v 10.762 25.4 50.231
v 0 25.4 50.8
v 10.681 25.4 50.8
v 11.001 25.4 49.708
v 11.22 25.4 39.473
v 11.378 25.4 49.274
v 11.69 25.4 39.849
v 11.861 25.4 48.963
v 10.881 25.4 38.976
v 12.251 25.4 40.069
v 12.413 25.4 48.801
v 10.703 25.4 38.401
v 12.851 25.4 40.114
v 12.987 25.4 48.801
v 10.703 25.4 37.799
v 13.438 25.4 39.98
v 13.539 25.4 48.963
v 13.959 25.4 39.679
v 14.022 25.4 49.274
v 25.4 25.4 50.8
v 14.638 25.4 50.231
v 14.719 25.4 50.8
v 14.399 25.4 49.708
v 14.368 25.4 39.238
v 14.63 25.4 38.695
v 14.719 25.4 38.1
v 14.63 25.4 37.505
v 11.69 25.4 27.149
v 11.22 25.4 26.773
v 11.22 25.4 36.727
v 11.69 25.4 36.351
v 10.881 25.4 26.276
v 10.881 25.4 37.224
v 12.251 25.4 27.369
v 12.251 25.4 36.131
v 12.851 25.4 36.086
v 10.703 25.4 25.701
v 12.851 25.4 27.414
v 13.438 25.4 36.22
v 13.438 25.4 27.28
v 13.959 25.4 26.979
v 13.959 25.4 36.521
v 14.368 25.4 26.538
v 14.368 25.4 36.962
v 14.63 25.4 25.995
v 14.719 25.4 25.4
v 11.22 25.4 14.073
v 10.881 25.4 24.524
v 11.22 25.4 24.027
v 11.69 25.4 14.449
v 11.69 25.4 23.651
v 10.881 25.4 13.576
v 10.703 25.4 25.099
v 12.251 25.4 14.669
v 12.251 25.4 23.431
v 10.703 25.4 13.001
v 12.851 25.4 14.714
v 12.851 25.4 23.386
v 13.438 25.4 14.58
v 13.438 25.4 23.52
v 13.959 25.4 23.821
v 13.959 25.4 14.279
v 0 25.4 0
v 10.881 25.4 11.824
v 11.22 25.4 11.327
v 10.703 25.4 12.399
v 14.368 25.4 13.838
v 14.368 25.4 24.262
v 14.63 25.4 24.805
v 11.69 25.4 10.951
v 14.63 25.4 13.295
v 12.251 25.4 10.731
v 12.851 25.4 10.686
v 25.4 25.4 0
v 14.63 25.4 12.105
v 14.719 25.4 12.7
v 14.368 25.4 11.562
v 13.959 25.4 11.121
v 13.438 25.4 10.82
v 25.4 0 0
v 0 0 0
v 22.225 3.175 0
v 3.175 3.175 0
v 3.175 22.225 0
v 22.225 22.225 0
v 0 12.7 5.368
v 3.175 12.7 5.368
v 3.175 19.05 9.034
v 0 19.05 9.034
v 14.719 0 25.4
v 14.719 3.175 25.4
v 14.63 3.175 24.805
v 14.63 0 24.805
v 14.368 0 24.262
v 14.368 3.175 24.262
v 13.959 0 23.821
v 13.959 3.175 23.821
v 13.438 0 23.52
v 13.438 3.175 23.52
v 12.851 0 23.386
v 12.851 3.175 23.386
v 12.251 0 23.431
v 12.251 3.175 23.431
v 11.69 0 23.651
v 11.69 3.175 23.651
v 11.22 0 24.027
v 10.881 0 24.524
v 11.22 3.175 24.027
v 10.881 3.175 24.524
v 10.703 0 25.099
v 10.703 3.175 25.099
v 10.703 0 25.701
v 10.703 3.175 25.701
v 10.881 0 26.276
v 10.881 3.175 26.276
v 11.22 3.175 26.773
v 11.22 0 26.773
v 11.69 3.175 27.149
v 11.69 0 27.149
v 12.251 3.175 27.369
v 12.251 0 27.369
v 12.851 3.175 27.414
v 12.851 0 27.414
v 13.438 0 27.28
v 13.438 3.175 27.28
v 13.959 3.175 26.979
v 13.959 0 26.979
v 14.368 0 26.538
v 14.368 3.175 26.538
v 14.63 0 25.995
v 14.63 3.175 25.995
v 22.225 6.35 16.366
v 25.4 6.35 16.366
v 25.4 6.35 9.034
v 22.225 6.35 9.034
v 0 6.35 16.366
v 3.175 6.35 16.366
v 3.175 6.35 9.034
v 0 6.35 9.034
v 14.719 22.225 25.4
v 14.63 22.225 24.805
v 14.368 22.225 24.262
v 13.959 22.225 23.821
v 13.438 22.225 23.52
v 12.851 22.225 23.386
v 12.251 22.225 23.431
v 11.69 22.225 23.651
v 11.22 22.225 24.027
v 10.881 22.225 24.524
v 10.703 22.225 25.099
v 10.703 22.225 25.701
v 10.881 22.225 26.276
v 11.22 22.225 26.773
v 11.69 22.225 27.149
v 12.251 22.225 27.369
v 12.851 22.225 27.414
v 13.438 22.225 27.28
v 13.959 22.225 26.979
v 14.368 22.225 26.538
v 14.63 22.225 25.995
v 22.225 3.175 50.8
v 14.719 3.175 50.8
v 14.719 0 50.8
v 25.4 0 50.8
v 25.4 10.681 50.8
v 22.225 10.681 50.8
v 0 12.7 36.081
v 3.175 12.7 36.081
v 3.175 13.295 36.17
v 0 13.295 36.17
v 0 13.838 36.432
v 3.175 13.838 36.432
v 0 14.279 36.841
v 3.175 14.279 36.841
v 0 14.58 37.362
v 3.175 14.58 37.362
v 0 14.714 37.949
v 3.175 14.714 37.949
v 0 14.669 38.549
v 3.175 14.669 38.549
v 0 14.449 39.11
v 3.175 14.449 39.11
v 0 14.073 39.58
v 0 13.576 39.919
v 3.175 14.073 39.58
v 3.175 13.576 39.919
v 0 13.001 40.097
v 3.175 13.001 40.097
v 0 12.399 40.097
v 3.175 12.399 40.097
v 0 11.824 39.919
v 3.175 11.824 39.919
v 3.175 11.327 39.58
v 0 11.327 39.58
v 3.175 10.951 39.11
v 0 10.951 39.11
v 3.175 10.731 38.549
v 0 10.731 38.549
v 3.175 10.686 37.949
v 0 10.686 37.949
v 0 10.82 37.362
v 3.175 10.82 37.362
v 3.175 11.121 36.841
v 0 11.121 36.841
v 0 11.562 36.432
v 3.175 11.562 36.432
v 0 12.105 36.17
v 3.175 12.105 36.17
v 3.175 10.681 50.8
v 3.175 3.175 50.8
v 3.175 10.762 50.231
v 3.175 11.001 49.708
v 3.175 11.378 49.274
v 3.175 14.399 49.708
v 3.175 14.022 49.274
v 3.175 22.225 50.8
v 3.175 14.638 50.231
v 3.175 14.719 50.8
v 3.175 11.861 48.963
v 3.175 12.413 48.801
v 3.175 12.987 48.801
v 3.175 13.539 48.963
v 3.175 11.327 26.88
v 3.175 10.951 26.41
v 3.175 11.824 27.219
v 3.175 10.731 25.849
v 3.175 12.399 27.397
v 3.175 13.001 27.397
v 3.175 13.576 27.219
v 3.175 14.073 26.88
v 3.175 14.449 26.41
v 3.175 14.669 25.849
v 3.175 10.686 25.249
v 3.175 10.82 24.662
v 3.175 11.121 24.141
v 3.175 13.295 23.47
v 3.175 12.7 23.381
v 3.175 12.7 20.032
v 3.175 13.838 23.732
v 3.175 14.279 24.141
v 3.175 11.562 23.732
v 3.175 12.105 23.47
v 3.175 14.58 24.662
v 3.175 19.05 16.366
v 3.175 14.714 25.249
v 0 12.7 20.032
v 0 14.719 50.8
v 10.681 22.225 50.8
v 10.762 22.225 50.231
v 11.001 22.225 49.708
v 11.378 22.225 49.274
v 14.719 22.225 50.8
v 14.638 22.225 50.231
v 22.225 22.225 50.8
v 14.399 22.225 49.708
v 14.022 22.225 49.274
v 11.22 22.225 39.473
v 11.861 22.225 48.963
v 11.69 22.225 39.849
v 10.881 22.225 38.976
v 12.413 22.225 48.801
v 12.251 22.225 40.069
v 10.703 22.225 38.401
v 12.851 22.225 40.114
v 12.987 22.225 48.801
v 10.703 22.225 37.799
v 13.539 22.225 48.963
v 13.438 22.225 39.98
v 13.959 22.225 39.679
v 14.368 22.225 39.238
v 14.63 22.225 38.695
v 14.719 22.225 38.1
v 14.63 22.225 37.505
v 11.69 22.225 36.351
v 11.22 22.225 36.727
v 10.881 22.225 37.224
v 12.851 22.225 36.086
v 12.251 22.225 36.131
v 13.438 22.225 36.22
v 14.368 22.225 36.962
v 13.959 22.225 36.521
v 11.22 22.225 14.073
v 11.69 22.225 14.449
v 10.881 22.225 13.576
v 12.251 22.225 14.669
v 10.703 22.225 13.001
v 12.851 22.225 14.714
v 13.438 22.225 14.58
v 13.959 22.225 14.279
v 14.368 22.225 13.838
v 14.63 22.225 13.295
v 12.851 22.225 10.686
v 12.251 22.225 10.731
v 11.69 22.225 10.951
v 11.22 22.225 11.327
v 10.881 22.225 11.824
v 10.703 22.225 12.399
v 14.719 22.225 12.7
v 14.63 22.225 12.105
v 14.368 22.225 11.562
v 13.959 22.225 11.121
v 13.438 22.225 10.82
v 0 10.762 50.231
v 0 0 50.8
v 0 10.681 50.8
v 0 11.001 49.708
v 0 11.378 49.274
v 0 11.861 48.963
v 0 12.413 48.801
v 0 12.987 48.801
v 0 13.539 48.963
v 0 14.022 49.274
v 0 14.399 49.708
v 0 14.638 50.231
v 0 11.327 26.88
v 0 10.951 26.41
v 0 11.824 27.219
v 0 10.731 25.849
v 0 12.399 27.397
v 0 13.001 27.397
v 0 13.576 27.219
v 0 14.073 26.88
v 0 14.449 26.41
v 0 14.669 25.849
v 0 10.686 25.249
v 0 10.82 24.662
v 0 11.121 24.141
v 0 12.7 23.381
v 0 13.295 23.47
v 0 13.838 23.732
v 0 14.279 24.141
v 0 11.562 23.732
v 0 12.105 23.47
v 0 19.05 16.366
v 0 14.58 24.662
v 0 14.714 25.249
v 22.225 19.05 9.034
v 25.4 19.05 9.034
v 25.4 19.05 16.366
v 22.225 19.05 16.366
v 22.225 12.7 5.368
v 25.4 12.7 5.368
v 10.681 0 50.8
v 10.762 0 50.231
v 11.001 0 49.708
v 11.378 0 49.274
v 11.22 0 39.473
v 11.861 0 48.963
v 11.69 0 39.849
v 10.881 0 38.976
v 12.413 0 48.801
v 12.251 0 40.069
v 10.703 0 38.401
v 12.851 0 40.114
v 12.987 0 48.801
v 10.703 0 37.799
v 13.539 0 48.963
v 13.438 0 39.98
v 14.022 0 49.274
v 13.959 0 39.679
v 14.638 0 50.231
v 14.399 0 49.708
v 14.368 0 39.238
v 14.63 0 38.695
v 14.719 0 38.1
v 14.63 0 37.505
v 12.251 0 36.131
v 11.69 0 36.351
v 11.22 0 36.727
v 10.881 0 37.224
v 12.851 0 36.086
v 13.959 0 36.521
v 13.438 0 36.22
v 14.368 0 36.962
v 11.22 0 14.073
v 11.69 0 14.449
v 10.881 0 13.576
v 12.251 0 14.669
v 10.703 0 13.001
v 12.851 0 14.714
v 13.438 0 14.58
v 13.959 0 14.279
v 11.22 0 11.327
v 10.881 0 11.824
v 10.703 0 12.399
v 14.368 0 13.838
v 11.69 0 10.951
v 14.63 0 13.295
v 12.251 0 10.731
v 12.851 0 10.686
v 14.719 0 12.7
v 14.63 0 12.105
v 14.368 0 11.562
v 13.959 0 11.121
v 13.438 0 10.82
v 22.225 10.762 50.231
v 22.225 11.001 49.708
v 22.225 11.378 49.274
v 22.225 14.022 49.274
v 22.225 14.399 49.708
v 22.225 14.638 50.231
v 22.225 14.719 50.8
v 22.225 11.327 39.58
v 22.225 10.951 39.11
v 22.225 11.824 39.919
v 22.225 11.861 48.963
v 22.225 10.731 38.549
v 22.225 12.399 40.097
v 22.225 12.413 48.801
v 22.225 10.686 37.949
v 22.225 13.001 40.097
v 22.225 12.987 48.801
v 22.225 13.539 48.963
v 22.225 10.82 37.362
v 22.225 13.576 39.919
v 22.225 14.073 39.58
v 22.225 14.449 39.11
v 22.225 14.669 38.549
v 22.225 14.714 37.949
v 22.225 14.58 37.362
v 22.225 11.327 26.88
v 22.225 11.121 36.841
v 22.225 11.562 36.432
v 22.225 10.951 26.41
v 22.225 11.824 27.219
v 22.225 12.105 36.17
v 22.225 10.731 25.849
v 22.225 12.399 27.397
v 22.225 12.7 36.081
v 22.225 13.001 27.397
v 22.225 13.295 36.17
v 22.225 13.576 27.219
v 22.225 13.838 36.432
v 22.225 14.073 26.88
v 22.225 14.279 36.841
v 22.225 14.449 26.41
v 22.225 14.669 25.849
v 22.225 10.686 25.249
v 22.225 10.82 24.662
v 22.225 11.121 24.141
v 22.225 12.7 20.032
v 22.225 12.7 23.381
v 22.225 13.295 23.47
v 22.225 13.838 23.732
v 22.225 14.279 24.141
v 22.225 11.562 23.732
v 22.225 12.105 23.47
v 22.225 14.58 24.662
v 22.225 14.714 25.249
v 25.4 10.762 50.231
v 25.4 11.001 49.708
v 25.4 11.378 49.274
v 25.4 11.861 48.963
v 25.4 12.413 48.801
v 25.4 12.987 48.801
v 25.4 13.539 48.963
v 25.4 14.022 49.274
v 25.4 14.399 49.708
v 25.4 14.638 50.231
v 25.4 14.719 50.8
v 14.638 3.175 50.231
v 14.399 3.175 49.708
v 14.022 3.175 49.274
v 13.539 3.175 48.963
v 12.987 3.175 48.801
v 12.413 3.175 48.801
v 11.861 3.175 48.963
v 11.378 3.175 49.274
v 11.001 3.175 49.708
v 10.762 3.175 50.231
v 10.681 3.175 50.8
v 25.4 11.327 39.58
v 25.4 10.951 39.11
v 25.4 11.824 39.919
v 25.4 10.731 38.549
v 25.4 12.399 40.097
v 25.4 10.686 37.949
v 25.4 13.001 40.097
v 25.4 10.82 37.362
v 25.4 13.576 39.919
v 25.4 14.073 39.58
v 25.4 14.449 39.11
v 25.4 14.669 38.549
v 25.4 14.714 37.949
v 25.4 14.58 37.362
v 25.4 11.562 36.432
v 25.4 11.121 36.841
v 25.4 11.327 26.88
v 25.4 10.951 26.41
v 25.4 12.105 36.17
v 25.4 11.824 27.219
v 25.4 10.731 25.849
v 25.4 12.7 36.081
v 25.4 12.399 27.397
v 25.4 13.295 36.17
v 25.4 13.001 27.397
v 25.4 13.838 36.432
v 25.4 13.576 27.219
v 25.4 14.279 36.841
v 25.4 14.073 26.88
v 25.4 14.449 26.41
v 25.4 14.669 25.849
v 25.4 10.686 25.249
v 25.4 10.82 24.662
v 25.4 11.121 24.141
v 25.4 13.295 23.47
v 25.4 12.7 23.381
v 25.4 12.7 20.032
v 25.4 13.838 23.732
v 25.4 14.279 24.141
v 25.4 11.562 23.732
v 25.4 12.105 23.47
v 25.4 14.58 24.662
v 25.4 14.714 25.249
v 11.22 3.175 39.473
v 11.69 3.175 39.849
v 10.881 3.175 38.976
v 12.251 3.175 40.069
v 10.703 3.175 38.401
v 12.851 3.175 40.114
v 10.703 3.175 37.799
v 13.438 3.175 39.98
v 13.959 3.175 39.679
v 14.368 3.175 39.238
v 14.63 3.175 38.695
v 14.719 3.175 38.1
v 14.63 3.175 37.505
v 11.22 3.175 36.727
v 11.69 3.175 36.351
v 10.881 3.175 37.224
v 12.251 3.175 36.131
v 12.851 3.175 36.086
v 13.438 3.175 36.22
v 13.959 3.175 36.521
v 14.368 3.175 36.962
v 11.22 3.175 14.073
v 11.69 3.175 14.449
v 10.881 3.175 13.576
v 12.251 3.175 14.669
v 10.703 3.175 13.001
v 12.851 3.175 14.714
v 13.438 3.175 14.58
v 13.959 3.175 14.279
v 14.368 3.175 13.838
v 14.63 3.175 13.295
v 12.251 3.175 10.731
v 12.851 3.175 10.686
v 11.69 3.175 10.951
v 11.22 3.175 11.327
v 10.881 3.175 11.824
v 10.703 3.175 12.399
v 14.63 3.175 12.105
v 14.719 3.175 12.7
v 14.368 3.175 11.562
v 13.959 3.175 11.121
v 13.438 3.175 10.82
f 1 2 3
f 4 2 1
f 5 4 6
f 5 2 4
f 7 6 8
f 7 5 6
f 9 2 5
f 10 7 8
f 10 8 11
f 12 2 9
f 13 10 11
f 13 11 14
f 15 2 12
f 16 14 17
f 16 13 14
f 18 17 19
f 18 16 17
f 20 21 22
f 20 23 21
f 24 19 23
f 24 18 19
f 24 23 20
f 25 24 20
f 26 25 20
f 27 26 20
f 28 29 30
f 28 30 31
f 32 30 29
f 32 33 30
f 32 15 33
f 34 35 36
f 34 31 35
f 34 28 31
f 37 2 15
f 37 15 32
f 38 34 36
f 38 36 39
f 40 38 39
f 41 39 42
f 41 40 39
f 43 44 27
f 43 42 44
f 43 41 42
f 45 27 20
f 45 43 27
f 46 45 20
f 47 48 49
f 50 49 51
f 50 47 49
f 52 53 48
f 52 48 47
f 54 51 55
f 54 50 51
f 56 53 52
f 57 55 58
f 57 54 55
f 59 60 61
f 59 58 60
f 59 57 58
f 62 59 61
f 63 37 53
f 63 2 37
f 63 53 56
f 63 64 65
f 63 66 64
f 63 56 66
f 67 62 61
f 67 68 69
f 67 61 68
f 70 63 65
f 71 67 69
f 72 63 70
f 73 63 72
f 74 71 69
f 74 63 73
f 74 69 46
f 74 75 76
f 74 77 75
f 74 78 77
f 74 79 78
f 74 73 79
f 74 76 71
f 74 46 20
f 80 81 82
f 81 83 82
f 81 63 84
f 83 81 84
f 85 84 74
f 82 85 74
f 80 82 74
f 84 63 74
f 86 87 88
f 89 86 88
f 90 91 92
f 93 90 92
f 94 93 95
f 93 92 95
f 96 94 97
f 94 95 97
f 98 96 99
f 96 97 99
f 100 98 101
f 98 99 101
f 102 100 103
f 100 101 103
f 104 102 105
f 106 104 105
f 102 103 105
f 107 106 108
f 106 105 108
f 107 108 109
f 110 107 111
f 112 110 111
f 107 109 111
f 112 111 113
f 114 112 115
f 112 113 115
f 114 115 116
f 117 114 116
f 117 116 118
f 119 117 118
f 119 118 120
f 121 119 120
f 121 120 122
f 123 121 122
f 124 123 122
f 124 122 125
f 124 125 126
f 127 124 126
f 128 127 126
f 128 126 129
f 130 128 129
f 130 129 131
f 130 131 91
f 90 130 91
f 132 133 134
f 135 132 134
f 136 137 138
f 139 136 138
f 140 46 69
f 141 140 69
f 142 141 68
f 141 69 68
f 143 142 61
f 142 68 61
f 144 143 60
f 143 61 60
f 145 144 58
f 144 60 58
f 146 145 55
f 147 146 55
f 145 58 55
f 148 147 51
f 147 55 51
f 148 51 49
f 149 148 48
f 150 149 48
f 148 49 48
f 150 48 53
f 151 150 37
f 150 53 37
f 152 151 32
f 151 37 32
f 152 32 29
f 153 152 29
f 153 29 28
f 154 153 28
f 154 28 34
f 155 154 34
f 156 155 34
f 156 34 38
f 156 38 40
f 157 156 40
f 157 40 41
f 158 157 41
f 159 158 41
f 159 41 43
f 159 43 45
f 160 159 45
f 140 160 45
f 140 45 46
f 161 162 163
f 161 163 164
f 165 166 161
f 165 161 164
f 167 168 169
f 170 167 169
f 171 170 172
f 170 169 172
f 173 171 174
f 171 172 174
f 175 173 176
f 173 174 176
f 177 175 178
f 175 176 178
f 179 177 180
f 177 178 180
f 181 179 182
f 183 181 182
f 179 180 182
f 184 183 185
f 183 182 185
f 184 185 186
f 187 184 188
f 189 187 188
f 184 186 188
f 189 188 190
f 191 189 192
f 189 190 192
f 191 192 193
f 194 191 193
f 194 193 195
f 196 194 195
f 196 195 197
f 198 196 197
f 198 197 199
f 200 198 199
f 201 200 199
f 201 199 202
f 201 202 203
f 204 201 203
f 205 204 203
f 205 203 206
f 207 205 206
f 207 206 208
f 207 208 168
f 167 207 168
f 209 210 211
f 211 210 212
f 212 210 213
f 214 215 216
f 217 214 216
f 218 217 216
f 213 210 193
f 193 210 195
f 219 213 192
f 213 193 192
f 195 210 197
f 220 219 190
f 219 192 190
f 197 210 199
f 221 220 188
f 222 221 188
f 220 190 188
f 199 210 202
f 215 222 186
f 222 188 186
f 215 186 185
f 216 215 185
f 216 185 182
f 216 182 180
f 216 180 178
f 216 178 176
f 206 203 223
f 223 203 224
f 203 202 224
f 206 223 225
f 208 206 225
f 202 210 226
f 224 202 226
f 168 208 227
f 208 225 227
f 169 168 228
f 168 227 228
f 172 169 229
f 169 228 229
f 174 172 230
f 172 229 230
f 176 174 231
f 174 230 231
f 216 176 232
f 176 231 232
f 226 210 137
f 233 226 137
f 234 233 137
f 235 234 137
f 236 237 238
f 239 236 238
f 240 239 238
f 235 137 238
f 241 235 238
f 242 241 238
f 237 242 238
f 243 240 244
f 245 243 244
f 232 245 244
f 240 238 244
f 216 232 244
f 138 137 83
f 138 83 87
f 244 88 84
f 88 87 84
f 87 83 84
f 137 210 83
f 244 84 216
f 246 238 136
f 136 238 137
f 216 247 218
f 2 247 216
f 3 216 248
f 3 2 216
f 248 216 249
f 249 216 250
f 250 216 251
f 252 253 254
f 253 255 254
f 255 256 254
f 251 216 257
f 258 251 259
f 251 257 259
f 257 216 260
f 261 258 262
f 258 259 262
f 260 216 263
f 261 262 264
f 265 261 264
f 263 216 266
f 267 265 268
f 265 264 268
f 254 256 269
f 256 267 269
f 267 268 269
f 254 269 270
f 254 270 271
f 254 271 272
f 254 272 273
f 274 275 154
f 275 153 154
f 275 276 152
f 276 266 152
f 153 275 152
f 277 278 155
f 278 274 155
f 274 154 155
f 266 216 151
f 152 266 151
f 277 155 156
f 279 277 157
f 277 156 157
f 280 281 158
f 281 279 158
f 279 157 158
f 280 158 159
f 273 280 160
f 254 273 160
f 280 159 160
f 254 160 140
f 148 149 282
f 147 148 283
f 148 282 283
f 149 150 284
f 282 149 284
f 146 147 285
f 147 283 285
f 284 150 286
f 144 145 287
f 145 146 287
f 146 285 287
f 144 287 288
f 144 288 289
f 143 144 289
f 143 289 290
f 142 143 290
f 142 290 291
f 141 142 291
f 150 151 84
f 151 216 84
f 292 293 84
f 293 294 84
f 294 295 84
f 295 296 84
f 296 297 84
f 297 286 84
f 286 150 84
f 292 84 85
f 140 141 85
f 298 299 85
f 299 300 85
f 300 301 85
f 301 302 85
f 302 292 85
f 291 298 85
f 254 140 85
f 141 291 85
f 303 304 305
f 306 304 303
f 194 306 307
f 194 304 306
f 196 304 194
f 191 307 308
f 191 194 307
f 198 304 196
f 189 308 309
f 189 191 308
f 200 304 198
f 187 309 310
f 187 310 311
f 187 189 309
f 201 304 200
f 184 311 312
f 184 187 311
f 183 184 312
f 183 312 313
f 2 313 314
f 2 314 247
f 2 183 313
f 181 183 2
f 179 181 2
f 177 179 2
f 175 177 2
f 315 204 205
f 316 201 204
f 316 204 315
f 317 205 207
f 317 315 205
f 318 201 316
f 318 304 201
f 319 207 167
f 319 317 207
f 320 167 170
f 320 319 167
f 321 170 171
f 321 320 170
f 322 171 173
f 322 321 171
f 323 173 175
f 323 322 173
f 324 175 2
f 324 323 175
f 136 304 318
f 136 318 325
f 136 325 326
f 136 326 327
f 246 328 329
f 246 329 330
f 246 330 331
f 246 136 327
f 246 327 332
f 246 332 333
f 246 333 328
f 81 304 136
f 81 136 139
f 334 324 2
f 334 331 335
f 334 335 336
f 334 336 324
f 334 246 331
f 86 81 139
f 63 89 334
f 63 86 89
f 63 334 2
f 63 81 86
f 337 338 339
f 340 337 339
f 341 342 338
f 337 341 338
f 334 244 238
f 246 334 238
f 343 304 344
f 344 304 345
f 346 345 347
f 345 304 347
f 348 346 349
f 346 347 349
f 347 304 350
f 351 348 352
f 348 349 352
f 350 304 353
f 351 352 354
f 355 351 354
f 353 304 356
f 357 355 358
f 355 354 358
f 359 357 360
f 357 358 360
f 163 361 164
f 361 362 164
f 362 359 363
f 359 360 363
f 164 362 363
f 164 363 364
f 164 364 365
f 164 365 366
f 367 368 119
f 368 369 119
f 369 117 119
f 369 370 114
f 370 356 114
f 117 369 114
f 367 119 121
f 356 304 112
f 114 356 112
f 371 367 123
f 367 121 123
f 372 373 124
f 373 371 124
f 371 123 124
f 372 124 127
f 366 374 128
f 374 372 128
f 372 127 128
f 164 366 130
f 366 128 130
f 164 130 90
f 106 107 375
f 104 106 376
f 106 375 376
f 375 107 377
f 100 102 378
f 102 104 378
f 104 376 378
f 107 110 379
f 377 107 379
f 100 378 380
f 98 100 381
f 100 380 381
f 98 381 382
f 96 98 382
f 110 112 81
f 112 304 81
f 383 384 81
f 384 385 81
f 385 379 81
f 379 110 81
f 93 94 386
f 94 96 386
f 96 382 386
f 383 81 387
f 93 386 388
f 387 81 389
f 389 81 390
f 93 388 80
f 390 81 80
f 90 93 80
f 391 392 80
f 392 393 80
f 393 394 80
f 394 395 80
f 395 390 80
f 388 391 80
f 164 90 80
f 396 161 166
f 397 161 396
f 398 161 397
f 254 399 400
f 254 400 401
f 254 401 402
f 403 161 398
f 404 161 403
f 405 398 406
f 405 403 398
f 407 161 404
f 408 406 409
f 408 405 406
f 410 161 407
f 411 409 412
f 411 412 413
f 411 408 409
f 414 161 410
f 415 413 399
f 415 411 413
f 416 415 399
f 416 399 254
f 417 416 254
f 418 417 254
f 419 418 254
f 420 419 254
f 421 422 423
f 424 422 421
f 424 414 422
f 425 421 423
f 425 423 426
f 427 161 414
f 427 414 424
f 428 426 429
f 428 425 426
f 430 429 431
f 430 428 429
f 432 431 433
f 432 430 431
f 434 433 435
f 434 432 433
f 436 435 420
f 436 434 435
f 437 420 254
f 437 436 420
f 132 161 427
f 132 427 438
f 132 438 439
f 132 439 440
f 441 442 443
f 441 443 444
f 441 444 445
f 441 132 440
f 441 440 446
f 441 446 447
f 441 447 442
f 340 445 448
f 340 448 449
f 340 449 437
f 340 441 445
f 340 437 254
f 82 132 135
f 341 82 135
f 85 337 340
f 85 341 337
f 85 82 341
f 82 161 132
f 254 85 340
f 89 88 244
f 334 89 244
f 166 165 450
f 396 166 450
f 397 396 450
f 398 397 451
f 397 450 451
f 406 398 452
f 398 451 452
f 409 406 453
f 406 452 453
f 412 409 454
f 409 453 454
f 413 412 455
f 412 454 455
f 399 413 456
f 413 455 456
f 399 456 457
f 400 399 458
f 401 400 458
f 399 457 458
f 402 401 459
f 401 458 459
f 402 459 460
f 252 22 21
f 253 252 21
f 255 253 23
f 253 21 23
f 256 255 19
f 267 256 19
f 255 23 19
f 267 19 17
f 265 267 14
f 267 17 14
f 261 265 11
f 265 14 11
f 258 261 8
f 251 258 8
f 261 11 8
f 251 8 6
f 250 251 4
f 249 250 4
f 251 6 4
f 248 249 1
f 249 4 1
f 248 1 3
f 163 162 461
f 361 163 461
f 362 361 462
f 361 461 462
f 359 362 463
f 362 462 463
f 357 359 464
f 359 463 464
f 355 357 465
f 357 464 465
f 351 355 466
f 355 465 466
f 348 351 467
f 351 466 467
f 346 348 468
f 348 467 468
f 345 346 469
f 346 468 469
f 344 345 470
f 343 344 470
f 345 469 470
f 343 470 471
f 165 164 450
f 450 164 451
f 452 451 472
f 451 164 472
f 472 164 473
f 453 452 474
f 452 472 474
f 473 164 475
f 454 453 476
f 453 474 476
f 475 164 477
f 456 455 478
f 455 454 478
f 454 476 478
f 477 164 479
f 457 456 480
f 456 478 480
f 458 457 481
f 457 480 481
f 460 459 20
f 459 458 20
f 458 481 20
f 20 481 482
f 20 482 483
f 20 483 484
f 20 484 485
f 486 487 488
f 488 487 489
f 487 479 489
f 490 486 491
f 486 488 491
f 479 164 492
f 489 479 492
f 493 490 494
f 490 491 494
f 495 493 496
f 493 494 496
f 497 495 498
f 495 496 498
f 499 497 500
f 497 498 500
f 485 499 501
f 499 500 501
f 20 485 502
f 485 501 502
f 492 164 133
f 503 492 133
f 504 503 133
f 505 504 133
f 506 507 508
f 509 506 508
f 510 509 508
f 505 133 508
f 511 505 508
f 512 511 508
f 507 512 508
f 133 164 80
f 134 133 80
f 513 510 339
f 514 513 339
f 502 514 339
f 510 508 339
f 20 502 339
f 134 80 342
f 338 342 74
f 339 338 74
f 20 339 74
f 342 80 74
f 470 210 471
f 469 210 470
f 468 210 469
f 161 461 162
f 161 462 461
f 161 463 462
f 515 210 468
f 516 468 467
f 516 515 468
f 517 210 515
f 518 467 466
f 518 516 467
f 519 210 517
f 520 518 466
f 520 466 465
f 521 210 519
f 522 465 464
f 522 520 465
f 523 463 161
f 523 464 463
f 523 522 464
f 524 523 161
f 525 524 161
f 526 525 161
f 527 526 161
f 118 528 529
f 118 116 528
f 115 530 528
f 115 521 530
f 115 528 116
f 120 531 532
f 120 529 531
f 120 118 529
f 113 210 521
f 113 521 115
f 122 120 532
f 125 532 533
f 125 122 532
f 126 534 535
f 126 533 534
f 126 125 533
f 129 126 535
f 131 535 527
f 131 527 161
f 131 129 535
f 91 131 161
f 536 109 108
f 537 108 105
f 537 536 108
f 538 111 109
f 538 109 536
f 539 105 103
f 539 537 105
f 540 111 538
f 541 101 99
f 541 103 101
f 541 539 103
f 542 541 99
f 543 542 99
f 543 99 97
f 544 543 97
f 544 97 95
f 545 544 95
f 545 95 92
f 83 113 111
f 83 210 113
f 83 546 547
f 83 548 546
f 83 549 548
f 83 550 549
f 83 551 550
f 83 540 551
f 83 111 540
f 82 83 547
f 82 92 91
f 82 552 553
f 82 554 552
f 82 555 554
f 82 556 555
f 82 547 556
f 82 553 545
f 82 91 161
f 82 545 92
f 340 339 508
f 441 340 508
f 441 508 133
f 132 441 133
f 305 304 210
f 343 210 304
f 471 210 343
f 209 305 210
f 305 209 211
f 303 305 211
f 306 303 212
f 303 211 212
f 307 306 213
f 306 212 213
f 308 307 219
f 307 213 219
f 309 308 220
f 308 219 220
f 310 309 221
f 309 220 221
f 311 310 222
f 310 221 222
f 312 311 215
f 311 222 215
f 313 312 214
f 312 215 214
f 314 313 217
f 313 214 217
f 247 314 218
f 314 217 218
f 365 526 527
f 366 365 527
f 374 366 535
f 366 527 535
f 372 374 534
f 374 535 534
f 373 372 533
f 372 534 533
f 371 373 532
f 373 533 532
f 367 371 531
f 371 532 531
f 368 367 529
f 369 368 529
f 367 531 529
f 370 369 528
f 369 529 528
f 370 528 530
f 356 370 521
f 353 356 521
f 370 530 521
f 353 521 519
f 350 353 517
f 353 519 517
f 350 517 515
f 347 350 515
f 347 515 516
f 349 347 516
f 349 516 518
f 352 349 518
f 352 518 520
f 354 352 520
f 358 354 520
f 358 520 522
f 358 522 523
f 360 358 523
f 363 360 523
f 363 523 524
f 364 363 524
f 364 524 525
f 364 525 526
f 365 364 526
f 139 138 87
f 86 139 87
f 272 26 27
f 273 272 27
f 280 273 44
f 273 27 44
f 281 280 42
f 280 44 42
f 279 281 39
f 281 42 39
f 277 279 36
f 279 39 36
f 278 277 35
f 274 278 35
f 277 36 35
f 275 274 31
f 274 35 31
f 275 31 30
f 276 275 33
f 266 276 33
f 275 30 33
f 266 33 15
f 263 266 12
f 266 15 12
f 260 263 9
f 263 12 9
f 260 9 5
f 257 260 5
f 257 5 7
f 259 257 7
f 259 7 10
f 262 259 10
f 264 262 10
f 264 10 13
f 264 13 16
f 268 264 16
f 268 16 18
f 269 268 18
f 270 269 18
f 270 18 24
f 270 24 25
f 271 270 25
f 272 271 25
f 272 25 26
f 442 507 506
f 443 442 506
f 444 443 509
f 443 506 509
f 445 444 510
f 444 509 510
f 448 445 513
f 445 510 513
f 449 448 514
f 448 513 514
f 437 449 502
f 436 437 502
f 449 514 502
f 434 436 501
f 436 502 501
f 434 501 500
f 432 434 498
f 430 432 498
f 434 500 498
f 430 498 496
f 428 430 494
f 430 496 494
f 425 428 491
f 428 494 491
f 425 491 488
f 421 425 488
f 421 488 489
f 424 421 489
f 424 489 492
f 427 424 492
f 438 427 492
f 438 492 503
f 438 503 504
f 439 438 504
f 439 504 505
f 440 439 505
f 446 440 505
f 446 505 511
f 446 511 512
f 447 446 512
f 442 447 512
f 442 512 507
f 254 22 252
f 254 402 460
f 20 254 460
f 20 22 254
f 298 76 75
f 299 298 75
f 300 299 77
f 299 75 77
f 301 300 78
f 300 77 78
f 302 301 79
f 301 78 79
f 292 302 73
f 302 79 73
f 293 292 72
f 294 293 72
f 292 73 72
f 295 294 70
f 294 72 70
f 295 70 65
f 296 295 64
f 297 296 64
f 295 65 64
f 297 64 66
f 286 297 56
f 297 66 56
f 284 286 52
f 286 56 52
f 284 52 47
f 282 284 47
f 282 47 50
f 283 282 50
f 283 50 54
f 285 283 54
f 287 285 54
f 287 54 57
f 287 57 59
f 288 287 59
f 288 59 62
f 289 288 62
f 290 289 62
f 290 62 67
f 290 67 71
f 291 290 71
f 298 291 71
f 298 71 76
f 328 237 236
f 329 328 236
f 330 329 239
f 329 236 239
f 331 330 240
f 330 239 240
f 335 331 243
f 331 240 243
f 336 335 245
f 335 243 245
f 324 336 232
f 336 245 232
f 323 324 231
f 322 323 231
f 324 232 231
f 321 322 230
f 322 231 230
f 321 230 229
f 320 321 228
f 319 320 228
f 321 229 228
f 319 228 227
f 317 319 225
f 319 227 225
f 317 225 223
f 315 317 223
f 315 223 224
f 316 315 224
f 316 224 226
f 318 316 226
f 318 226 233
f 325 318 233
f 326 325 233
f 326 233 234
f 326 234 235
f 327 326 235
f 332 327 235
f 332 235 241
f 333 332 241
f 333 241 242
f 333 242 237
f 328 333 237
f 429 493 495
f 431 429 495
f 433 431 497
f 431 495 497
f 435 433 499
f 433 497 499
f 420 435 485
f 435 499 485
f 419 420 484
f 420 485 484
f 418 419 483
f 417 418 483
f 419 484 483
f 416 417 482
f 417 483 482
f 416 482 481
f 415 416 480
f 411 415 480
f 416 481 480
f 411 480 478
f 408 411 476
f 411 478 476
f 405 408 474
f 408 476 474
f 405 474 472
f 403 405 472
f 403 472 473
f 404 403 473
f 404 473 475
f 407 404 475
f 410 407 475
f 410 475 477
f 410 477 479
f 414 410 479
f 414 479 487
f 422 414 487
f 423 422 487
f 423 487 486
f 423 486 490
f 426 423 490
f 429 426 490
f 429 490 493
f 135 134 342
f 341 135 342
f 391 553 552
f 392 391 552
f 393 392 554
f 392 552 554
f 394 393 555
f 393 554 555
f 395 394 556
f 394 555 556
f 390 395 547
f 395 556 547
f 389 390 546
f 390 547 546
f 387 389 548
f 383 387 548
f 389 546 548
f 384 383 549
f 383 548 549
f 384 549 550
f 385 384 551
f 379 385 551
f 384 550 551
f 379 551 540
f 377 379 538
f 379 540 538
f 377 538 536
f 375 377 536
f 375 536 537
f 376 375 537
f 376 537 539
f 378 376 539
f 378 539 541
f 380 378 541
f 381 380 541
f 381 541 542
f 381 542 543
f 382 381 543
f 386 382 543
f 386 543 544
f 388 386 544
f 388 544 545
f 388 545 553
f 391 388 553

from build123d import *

# Parameters (mm, degrees)
SKETCH1_W           = 25.4
SKETCH1_H           = 25.4
SKETCH1_W_2         = 19.05
SKETCH1_H_2         = 19.05
BOSS_EXTRUDE1_DEPTH = 63.5
SKETCH2_R           = 2.0193
CUT_EXTRUDE1_DEPTH  = 63.5
SKETCH3_R           = 2.0193
CUT_EXTRUDE2_DEPTH  = 63.5
CUT_EXTRUDE3_DEPTH  = 28.702
SKETCH5_W           = 25.4
SKETCH5_H           = 25.4
CUT_EXTRUDE4_DEPTH  = 12.7


with BuildPart() as part:
    # Sketch1 → Boss-Extrude1 (new body)
    with BuildSketch(Plane.XY):
        with Locations((12.7, 12.7)):
            Rectangle(SKETCH1_W, SKETCH1_H)
        with Locations((12.7, 12.7)):
            Rectangle(SKETCH1_W_2, SKETCH1_H_2, mode=Mode.SUBTRACT)
    extrude(amount=BOSS_EXTRUDE1_DEPTH)

    # Sketch2 → Cut-Extrude1 (cut)
    with BuildSketch(Plane(origin=(0, 25.4, 0), x_dir=(1, 0, 0), z_dir=(0, 1, 0))):
        with Locations((12.7, -50.8)):
            Circle(SKETCH2_R)
        with Locations((12.7, -38.1)):
            Circle(SKETCH2_R)
        with Locations((12.7, -25.4)):
            Circle(SKETCH2_R)
        with Locations((12.7, -12.7)):
            Circle(SKETCH2_R)
    extrude(amount=-CUT_EXTRUDE1_DEPTH, mode=Mode.SUBTRACT)

    # Sketch3 → Cut-Extrude2 (cut)
    with BuildSketch(Plane(origin=(25.4, 0, 0), x_dir=(0, 0, -1), z_dir=(1, 0, 0))):
        with Locations((-50.8, 12.7)):
            Circle(SKETCH3_R)
        with Locations((-38.1, 12.7)):
            Circle(SKETCH3_R)
        with Locations((-25.4, 12.7)):
            Circle(SKETCH3_R)
        with Locations((-12.7, 12.7)):
            Circle(SKETCH3_R)
    extrude(amount=-CUT_EXTRUDE2_DEPTH, mode=Mode.SUBTRACT)

    # Sketch4 → Cut-Extrude3 (cut)
    with BuildSketch(Plane(origin=(25.4, 0, 0), x_dir=(0, 0, -1), z_dir=(1, 0, 0))):
        Polygon((-9.033825791, 19.05), (-16.366174209, 19.05), (-20.032348419, 12.7), (-16.366174209, 6.35), (-9.033825791, 6.35), (-5.367651581, 12.7), align=None)
    extrude(amount=-CUT_EXTRUDE3_DEPTH, mode=Mode.SUBTRACT)

    # Sketch5 → Cut-Extrude4 (cut)
    with BuildSketch(Plane.XY.offset(63.5)):
        with Locations((12.7, 12.7)):
            Rectangle(SKETCH5_W, SKETCH5_H)
    extrude(amount=-CUT_EXTRUDE4_DEPTH, mode=Mode.SUBTRACT)


solid = part.part
